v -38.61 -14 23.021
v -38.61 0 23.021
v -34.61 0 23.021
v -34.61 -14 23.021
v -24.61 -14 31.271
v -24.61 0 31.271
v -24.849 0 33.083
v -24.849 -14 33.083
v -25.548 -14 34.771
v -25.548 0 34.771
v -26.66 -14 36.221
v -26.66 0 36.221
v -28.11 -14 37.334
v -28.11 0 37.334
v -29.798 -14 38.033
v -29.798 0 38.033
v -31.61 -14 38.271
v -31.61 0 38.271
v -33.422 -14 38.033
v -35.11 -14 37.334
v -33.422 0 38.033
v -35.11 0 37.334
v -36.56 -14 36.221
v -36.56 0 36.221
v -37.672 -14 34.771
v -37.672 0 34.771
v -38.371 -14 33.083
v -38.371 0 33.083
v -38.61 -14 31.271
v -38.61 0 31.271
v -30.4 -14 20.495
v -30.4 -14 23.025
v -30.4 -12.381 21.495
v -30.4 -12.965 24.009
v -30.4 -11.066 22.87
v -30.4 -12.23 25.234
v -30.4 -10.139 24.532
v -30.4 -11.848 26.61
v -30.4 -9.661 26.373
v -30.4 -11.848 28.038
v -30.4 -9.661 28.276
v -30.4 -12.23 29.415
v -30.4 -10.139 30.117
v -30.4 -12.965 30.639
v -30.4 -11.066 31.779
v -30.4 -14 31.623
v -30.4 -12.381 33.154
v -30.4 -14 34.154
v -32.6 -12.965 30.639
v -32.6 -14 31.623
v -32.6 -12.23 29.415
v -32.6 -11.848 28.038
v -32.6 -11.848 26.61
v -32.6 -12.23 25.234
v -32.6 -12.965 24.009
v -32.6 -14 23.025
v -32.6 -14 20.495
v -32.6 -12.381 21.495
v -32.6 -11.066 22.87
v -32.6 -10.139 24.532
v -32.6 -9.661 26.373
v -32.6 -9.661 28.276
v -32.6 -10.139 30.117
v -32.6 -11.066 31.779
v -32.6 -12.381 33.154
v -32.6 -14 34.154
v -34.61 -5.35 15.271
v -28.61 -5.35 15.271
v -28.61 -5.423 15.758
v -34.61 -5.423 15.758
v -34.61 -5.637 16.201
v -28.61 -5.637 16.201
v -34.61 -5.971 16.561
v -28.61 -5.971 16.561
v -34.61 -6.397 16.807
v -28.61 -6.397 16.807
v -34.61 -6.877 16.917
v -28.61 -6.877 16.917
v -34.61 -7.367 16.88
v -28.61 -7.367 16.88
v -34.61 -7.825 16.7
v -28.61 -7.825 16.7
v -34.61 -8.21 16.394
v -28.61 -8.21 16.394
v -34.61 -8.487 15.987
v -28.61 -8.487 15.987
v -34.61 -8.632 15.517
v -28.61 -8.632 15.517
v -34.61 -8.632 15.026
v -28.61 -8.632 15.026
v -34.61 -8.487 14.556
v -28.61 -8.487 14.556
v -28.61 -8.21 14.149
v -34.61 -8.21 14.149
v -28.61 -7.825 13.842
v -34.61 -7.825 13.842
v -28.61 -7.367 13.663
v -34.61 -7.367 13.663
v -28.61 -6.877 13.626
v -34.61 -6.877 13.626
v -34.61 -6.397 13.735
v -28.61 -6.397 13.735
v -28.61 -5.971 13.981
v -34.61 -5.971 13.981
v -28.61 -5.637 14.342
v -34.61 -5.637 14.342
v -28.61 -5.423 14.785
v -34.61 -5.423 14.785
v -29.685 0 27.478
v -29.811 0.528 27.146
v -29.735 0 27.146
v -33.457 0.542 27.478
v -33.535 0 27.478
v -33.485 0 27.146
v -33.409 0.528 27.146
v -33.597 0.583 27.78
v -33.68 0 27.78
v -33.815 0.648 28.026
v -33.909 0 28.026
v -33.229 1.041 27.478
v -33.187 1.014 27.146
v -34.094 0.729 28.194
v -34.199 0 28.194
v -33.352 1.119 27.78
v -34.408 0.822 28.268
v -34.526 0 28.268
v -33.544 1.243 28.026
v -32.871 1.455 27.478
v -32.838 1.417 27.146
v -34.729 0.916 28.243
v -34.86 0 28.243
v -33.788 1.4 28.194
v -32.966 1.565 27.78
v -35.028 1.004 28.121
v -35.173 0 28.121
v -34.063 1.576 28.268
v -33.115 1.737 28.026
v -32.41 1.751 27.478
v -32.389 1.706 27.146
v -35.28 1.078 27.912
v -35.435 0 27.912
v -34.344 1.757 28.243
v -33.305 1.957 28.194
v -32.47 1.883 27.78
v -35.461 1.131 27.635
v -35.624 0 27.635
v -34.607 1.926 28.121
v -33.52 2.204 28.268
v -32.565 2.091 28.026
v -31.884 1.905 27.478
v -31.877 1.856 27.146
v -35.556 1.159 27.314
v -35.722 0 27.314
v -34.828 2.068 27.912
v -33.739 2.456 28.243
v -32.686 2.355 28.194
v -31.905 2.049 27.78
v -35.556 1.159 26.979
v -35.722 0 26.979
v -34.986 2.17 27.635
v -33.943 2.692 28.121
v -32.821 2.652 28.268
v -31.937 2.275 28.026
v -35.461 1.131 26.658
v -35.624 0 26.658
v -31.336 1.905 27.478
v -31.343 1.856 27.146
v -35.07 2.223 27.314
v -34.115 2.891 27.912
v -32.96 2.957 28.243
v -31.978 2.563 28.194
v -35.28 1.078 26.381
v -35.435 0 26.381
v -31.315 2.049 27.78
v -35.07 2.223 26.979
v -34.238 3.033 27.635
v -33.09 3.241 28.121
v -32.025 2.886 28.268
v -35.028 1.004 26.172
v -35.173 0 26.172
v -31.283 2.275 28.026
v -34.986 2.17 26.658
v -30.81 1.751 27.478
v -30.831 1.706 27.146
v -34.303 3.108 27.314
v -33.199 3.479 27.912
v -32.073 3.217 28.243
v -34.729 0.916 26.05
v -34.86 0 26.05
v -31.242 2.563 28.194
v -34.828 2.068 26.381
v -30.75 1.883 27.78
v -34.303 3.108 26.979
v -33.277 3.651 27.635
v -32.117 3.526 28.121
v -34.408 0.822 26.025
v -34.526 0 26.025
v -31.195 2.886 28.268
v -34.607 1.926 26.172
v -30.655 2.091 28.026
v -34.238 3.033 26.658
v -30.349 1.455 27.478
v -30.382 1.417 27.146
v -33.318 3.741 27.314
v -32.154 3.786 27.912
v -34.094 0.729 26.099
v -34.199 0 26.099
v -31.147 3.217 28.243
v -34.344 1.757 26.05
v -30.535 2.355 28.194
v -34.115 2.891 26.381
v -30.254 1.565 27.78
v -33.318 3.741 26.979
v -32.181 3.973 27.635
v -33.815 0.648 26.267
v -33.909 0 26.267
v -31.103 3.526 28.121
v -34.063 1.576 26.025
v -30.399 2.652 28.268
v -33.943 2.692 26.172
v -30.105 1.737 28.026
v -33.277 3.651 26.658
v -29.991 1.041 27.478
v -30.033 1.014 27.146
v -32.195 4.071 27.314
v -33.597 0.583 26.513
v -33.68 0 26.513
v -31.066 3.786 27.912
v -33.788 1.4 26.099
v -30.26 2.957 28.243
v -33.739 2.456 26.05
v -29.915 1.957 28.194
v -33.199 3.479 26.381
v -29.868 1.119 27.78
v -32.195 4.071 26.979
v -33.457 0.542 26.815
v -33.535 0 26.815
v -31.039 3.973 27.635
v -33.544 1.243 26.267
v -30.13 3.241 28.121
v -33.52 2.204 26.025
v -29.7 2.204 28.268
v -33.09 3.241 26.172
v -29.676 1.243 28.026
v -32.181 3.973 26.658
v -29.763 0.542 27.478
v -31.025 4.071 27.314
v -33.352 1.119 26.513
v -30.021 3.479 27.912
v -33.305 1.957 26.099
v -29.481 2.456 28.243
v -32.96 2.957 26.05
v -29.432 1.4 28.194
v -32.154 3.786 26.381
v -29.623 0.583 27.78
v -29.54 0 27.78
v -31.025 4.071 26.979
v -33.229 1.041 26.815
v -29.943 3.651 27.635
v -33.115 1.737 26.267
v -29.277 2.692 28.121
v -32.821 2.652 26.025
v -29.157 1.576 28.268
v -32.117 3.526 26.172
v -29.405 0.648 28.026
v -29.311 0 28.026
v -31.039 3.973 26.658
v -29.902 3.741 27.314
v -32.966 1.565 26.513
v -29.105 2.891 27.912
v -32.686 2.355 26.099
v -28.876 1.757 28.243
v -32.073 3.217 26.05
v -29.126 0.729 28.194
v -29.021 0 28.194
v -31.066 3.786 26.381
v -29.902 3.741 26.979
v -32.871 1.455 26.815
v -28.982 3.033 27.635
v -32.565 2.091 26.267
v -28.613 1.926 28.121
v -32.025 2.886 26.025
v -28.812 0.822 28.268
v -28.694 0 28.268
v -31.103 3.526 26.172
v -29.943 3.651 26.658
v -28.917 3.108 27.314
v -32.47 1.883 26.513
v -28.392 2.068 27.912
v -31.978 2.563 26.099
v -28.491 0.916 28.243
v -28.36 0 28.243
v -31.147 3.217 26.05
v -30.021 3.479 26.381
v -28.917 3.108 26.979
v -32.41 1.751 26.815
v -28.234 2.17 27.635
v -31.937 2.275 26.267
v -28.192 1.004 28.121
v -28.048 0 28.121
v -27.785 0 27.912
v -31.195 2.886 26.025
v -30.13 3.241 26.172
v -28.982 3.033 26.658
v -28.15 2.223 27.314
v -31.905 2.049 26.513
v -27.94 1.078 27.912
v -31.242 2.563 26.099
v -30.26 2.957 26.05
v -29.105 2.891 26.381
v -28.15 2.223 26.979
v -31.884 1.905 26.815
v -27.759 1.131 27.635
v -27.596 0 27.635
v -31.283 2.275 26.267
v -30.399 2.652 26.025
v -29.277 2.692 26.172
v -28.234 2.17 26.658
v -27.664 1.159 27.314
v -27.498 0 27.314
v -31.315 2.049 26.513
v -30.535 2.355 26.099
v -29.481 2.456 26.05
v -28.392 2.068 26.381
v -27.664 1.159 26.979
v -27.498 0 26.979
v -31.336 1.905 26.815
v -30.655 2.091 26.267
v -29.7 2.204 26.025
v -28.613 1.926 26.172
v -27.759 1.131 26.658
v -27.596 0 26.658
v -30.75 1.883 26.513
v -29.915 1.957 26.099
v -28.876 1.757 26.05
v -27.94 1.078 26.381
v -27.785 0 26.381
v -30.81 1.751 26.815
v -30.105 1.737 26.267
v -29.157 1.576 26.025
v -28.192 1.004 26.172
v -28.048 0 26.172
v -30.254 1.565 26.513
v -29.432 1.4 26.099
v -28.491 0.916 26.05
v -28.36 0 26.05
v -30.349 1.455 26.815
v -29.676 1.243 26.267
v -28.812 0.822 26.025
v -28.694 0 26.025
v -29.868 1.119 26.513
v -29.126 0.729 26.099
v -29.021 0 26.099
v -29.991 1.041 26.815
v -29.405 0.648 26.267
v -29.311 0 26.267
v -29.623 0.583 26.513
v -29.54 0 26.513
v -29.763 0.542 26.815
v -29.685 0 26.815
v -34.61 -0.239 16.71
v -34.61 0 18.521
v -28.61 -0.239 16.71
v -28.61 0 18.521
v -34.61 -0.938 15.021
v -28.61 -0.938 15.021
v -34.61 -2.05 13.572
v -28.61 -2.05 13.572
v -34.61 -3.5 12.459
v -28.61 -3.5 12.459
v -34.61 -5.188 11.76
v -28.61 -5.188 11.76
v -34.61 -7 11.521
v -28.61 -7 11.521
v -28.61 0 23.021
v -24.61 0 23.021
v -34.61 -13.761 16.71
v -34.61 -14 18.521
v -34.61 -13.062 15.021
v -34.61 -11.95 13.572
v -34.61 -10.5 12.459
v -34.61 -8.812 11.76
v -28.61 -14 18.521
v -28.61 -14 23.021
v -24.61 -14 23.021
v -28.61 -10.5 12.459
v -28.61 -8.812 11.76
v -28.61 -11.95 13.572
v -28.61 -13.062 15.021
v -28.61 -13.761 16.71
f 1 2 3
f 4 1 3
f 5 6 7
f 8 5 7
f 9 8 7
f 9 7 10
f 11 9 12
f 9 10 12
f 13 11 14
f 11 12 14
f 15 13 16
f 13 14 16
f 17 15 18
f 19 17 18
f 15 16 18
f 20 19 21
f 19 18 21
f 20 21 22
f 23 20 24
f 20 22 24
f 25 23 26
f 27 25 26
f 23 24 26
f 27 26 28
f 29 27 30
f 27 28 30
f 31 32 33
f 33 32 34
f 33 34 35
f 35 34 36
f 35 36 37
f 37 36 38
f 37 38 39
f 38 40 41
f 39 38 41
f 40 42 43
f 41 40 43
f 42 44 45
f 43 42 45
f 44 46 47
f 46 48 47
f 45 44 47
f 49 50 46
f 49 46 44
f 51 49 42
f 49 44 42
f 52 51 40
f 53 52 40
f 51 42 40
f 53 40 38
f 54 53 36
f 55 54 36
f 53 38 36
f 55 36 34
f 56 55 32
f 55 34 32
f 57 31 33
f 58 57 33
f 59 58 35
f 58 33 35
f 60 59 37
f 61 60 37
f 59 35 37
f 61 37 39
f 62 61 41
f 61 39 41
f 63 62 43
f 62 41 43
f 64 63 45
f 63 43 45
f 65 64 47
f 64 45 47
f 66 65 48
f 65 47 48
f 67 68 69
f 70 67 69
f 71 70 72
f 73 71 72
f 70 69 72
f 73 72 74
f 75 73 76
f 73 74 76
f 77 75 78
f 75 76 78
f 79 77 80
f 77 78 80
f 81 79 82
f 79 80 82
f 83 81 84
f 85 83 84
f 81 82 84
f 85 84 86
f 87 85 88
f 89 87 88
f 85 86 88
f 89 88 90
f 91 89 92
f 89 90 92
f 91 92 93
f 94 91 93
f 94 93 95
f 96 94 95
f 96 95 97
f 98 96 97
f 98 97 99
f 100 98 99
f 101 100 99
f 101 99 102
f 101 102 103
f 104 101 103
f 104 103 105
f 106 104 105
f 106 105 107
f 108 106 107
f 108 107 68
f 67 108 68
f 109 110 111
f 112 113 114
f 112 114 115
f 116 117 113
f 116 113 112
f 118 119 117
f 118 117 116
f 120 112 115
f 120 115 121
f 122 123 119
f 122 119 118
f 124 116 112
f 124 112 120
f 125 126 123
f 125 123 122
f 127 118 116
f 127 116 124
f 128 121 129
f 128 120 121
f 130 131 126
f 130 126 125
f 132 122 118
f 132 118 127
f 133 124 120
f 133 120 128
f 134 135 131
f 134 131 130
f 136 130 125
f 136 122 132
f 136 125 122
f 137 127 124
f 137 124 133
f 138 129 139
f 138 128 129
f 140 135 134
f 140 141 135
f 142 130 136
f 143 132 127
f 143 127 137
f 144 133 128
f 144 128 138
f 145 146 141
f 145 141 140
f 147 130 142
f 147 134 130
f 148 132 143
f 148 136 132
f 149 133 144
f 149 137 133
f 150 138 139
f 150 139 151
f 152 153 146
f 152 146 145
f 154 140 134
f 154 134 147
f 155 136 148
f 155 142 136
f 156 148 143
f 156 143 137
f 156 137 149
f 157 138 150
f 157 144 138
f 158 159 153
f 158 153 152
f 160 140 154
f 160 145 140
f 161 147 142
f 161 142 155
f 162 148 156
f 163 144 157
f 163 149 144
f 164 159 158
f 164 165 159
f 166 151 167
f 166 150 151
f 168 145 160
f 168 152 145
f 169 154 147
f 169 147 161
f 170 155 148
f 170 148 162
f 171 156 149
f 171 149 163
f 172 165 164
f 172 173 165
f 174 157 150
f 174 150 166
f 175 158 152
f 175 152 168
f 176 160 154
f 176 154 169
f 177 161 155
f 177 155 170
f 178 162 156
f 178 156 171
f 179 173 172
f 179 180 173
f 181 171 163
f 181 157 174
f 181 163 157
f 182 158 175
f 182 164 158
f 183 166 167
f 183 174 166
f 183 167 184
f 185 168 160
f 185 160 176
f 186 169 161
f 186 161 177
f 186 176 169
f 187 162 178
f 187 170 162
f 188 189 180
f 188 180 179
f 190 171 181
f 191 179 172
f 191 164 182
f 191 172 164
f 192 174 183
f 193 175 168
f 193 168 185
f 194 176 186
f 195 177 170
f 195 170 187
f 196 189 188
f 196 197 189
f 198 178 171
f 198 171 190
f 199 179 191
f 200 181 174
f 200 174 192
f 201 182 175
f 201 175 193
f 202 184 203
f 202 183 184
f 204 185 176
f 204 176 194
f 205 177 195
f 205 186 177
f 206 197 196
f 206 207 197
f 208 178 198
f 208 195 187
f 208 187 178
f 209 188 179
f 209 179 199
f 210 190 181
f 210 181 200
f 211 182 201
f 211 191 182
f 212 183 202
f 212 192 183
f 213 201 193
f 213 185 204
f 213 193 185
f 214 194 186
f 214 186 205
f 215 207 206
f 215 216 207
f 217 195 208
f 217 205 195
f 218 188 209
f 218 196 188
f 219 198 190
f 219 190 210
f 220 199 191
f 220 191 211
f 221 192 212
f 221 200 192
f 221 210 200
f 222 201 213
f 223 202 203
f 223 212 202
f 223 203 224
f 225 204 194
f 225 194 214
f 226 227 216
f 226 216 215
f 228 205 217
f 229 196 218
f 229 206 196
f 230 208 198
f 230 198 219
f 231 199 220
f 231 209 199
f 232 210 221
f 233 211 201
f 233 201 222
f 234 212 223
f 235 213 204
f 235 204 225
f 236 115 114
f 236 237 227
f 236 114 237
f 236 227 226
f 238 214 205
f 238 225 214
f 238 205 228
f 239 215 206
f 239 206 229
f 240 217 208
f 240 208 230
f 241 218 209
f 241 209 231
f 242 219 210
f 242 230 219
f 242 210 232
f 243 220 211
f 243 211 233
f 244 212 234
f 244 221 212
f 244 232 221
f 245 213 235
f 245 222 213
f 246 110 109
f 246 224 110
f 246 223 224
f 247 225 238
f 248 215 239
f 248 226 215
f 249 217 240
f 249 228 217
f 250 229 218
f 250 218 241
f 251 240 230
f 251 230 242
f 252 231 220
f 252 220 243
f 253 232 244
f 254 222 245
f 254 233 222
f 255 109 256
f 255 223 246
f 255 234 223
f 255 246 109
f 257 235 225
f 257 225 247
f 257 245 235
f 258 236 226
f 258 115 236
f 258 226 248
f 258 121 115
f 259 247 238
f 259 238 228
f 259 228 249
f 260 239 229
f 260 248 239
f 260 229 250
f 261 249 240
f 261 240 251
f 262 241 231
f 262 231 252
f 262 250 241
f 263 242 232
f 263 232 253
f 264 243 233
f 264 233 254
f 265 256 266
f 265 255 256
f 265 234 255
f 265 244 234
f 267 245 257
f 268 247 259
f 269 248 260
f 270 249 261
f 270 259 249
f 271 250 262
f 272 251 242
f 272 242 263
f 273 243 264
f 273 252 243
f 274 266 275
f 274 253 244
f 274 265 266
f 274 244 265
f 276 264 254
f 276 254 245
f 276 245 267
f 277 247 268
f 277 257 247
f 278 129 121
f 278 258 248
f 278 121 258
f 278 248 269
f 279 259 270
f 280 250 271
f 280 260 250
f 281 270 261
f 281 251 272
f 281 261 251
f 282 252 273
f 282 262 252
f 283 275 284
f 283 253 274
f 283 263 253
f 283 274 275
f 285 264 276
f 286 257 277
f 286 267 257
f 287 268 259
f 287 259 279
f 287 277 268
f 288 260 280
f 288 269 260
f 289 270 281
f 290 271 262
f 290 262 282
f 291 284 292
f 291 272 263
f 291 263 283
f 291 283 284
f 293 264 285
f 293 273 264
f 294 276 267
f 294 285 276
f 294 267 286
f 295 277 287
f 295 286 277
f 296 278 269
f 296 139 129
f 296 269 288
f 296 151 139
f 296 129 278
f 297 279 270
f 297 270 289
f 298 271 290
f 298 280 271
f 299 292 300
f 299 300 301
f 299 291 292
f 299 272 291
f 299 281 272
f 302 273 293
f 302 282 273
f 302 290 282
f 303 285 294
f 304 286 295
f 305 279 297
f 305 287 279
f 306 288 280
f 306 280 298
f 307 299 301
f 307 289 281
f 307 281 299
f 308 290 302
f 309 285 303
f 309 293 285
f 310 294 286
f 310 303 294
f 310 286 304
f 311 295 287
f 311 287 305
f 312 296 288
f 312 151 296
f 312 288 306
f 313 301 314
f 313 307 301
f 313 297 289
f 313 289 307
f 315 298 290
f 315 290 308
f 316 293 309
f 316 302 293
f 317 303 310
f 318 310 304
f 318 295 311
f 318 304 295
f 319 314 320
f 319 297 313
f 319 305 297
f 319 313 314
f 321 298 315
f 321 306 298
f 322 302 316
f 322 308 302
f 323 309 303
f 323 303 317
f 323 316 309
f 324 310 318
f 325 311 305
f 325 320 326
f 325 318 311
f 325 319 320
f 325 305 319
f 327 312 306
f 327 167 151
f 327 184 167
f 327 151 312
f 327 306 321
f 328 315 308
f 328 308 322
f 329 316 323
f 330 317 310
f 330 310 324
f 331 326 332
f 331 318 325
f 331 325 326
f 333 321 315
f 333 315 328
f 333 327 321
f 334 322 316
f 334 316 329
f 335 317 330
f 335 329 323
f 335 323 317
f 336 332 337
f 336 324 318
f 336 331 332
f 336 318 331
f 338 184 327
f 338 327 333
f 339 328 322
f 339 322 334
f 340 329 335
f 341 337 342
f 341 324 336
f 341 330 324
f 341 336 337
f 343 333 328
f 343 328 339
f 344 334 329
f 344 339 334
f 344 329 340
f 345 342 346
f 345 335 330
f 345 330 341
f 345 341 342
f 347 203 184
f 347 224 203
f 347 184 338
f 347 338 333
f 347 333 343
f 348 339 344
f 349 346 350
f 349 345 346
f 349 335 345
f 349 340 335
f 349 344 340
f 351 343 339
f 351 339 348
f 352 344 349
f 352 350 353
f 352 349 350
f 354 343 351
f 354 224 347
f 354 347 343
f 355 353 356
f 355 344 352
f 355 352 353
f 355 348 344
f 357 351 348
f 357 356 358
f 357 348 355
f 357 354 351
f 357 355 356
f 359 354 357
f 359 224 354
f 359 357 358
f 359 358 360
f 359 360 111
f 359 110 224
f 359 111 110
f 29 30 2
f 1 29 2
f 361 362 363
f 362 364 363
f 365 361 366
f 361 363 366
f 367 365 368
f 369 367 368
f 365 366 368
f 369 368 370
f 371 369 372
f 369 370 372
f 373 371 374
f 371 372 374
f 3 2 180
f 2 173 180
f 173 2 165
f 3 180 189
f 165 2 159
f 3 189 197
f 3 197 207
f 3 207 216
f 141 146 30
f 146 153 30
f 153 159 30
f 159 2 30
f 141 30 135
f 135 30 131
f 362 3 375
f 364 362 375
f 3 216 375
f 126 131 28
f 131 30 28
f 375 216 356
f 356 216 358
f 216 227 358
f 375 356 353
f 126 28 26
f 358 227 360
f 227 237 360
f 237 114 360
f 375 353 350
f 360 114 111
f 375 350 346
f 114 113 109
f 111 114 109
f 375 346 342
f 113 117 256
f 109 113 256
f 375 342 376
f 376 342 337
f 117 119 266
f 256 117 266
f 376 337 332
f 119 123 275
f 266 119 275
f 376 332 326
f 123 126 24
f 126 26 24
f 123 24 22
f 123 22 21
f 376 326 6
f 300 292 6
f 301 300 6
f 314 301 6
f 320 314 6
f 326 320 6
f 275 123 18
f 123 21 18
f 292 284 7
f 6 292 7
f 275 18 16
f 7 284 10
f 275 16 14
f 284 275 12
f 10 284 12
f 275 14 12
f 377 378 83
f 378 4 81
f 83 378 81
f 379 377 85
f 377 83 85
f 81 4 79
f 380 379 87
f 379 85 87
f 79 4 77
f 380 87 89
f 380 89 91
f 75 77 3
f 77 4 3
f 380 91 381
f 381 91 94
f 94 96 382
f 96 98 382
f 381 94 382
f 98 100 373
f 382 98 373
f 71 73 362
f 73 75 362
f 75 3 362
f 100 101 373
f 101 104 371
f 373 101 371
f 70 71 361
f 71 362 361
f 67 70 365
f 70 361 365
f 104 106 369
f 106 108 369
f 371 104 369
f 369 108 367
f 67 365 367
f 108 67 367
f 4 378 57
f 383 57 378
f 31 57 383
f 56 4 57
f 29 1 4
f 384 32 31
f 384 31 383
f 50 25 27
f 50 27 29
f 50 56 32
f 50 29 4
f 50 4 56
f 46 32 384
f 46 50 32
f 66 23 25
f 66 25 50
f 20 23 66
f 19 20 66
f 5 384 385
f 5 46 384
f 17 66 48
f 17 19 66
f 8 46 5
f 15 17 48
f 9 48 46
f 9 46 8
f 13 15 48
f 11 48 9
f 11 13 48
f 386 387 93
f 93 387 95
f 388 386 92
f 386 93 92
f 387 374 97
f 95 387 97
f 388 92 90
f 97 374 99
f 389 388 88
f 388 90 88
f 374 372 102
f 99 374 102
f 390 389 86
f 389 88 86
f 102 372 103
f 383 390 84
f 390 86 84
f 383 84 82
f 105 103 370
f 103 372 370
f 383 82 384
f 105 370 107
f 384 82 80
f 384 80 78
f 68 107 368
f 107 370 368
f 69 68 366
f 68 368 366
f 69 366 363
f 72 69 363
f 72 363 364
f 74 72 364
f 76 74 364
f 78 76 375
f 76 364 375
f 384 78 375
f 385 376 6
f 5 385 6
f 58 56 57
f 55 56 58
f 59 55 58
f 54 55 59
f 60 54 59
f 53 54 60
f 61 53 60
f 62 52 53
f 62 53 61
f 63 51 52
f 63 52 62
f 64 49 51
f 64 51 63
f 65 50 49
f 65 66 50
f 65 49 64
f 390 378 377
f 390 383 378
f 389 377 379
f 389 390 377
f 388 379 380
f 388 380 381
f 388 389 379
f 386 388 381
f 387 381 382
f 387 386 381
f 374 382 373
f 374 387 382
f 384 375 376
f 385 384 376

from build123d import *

# Parameters (mm, degrees)
F1_DEPTH  = 14
F2_R      = 1.65
F3_DEPTH  = 25
F4_R      = 6.99999
F5_R      = 1.125
F7_R      = 1.125
F9_W      = 14
F9_H      = 6.4348620027
F10_DEPTH = 29.7
F13_DEPTH = 1.1


# Not quite as in the source:
# - a fillet or chamfer is up to 0.001 mm smaller than in the source, because OpenCascade refuses the exact size


with BuildPart() as f1:
    # F0 (on Front) → F1 (new body)
    with BuildSketch(Plane.XZ):
        with BuildLine():
            ThreePointArc((-24.6100064665, 31.2714347113), (-31.6100064665, 38.2714347113), (-38.6100064665, 31.2714347113))
            Line((-38.6100064665, 31.2714347113), (-38.6100064665, 23.0214347113))
            Line((-38.6100064665, 23.0214347113), (-34.6100064665, 23.0214347113))
            Line((-34.6100064665, 23.0214347113), (-34.6100064665, 22.0214347113))
            Line((-34.6100064665, 22.0214347113), (-34.6100064665, 19.0214347113))
            Line((-34.6100064665, 19.0214347113), (-34.6100064665, 11.5214347113))
            Line((-34.6100064665, 11.5214347113), (-28.6100064665, 11.5214347113))
            Line((-28.6100064665, 11.5214347113), (-28.6100064665, 15.2714347113))
            Line((-28.6100064665, 15.2714347113), (-28.6100064665, 19.0214347113))
            Line((-28.6100064665, 19.0214347113), (-28.6100064665, 22.0214347113))
            Line((-28.6100064665, 22.0214347113), (-28.6100064665, 23.0214347113))
            Line((-28.6100064665, 23.0214347113), (-24.6100064665, 23.0214347113))
            Line((-24.6100064665, 23.0214347113), (-24.6100064665, 31.2714347113))
        make_face()
    extrude(amount=F1_DEPTH)

    # F2 (on face) → F3 (cut)
    with BuildSketch(Plane.YZ.offset(-28.6100064665)):
        with Locations((-7, 15.2714347113)):
            Circle(F2_R)
    extrude(amount=-F3_DEPTH, mode=Mode.SUBTRACT)

    # F4 (radius 7 in the source; OpenCascade refuses exactly that, so slightly less here)
    f4_edges = [f1.edges().sort_by_distance(p)[0] for p in [
        (-31.610006, -14, 11.521435),
        (-31.610006, 0, 11.521435),
    ]]
    fillet(f4_edges, radius=F4_R)

    # F5 (on face) → F6 (revolve)
    with BuildSketch(Plane.XZ.offset(14)):
        with Locations((-34.6100064665, 27.1464347113)):
            Circle(F5_R)
    revolve(axis=Axis((-31.6100064665, -14, 28.3964347113), (0, 0, -1)))

    # F7 (on face) → F8 (revolve)
    with BuildSketch(Plane(origin=(0, 0, 0), x_dir=(-1, 0, 0), z_dir=(0, 1, 0))):
        with Locations((28.6100064665, 27.1464347113)):
            Circle(F7_R)
    revolve(axis=Axis((-31.6100064665, 0, 28.3964347113), (0, 0, -1)))

    # F9 (on Top) → F10 (cut)
    with BuildSketch(Plane.XY):
        with Locations((-31.6100064665, -17.2174310014)):
            Rectangle(F9_W, F9_H)
    extrude(amount=F10_DEPTH, mode=Mode.SUBTRACT)

    # F12 (on offset) → F13 (cut, symmetric)
    with BuildSketch(Plane.YZ.offset(-31.5)):
        with BuildLine():
            ThreePointArc((-14, 31.6231168223), (-11.8, 27.3242797703), (-14, 23.0254427182))
            Line((-14, 23.0254427182), (-14, 20.4949313387))
            ThreePointArc((-14, 20.4949313387), (-9.6, 27.3242797703), (-14, 34.1536282018))
            Line((-14, 34.1536282018), (-14, 31.6231168223))
        make_face()
    extrude(amount=F13_DEPTH, both=True, mode=Mode.SUBTRACT)


solid = f1.part
